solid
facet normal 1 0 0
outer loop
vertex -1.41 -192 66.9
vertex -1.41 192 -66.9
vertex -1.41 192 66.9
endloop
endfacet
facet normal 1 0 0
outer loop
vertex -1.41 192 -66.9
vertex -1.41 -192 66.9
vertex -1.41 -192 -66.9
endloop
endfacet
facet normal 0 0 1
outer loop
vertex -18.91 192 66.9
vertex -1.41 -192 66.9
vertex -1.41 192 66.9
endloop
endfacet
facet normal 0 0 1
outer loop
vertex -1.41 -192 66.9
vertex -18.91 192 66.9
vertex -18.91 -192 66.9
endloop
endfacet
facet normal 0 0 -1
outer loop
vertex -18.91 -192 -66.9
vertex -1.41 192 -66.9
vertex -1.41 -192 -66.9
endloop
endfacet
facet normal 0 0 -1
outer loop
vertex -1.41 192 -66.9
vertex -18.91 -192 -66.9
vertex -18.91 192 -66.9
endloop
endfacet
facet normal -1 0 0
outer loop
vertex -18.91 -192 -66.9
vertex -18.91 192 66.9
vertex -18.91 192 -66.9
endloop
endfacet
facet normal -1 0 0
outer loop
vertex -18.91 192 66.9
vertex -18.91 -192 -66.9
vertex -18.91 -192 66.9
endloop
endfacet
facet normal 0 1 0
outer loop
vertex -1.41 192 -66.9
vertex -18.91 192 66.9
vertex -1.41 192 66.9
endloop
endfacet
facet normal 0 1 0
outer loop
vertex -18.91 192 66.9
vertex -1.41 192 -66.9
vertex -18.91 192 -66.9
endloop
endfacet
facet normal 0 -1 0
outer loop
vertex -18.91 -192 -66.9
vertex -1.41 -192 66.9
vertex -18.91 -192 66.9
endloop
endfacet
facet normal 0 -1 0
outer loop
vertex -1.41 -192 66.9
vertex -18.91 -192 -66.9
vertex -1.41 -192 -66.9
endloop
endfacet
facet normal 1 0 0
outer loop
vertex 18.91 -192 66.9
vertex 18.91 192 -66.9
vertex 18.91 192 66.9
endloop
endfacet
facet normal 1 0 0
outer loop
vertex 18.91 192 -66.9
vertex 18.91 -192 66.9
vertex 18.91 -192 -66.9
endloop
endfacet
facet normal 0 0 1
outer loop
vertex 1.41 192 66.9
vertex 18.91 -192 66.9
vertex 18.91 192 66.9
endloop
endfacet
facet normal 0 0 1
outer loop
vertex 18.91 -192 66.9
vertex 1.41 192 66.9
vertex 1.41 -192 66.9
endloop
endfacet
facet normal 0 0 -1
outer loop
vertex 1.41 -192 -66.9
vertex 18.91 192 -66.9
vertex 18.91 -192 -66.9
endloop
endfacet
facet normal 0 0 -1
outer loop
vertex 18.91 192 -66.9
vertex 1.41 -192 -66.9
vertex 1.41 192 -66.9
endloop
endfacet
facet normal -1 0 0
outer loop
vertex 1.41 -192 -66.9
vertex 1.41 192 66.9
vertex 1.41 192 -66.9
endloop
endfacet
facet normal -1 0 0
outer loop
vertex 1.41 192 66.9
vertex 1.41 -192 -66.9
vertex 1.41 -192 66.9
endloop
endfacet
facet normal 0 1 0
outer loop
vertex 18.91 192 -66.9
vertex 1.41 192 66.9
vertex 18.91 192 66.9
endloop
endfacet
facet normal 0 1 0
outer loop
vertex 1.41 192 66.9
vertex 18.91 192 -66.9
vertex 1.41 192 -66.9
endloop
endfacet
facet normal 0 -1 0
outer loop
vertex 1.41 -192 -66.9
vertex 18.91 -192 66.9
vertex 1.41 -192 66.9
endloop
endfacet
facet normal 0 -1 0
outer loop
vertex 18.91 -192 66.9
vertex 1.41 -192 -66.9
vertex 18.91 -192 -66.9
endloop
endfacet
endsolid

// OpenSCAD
// ============================================================================
// Atom Lithography Machine — Parametric OpenSCAD Module (S7.2-02)
// ============================================================================
// part_id           : S7.2-02
// parent_bom_id     : S7.2
// subsystem         : S7
// part_name         : Yuksek hizli dijital isaretci (marker) ve darbe siralamaci karti
// material          : Rogers
// temp_stage        : 300 K (kabin)
// vacuum_grade      : Atmosfer
// tolerance         : ±1 ns
// computed_mass_kg  : 1.40000
// envelope_mm       : 37.820 x 393.200 x 133.800
// design_maturity   : M0_M1_DETAILED_CAD_DESIGN_ONLY
// no_lab_measurement: true
// iec61508_certified: false
// semi_s2_certified : false
// Units: millimeters (mm)
// ============================================================================

$fn = 64;

// Nominal bounding envelope parameters (mm)
bbox_x = 37.8200;
bbox_y = 393.2000;
bbox_z = 133.8000;

// Part-specific parametric dimensions
n_cards = 2;
slot_pitch_mm = 20.32;
card_depth_mm = 380.0;

// Interface / port parameters (mm)

module part_S7_2_02() {
  union() {
    // PXIe slot 7 card module
    translate([-10.160, 0.000, 0.000]) cube([17.500, 384.000, 133.800], center=true);
    // PXIe slot 8 card module
    translate([10.160, 0.000, 0.000]) cube([17.500, 384.000, 133.800], center=true);
  }
}

// World assembly mounting transform (global machine frame, mm / deg):
// translate([1459.680, -242.400, 578.950]) rotate([0.000, 0.000, 0.000]) part_S7_2_02();

part_S7_2_02();
